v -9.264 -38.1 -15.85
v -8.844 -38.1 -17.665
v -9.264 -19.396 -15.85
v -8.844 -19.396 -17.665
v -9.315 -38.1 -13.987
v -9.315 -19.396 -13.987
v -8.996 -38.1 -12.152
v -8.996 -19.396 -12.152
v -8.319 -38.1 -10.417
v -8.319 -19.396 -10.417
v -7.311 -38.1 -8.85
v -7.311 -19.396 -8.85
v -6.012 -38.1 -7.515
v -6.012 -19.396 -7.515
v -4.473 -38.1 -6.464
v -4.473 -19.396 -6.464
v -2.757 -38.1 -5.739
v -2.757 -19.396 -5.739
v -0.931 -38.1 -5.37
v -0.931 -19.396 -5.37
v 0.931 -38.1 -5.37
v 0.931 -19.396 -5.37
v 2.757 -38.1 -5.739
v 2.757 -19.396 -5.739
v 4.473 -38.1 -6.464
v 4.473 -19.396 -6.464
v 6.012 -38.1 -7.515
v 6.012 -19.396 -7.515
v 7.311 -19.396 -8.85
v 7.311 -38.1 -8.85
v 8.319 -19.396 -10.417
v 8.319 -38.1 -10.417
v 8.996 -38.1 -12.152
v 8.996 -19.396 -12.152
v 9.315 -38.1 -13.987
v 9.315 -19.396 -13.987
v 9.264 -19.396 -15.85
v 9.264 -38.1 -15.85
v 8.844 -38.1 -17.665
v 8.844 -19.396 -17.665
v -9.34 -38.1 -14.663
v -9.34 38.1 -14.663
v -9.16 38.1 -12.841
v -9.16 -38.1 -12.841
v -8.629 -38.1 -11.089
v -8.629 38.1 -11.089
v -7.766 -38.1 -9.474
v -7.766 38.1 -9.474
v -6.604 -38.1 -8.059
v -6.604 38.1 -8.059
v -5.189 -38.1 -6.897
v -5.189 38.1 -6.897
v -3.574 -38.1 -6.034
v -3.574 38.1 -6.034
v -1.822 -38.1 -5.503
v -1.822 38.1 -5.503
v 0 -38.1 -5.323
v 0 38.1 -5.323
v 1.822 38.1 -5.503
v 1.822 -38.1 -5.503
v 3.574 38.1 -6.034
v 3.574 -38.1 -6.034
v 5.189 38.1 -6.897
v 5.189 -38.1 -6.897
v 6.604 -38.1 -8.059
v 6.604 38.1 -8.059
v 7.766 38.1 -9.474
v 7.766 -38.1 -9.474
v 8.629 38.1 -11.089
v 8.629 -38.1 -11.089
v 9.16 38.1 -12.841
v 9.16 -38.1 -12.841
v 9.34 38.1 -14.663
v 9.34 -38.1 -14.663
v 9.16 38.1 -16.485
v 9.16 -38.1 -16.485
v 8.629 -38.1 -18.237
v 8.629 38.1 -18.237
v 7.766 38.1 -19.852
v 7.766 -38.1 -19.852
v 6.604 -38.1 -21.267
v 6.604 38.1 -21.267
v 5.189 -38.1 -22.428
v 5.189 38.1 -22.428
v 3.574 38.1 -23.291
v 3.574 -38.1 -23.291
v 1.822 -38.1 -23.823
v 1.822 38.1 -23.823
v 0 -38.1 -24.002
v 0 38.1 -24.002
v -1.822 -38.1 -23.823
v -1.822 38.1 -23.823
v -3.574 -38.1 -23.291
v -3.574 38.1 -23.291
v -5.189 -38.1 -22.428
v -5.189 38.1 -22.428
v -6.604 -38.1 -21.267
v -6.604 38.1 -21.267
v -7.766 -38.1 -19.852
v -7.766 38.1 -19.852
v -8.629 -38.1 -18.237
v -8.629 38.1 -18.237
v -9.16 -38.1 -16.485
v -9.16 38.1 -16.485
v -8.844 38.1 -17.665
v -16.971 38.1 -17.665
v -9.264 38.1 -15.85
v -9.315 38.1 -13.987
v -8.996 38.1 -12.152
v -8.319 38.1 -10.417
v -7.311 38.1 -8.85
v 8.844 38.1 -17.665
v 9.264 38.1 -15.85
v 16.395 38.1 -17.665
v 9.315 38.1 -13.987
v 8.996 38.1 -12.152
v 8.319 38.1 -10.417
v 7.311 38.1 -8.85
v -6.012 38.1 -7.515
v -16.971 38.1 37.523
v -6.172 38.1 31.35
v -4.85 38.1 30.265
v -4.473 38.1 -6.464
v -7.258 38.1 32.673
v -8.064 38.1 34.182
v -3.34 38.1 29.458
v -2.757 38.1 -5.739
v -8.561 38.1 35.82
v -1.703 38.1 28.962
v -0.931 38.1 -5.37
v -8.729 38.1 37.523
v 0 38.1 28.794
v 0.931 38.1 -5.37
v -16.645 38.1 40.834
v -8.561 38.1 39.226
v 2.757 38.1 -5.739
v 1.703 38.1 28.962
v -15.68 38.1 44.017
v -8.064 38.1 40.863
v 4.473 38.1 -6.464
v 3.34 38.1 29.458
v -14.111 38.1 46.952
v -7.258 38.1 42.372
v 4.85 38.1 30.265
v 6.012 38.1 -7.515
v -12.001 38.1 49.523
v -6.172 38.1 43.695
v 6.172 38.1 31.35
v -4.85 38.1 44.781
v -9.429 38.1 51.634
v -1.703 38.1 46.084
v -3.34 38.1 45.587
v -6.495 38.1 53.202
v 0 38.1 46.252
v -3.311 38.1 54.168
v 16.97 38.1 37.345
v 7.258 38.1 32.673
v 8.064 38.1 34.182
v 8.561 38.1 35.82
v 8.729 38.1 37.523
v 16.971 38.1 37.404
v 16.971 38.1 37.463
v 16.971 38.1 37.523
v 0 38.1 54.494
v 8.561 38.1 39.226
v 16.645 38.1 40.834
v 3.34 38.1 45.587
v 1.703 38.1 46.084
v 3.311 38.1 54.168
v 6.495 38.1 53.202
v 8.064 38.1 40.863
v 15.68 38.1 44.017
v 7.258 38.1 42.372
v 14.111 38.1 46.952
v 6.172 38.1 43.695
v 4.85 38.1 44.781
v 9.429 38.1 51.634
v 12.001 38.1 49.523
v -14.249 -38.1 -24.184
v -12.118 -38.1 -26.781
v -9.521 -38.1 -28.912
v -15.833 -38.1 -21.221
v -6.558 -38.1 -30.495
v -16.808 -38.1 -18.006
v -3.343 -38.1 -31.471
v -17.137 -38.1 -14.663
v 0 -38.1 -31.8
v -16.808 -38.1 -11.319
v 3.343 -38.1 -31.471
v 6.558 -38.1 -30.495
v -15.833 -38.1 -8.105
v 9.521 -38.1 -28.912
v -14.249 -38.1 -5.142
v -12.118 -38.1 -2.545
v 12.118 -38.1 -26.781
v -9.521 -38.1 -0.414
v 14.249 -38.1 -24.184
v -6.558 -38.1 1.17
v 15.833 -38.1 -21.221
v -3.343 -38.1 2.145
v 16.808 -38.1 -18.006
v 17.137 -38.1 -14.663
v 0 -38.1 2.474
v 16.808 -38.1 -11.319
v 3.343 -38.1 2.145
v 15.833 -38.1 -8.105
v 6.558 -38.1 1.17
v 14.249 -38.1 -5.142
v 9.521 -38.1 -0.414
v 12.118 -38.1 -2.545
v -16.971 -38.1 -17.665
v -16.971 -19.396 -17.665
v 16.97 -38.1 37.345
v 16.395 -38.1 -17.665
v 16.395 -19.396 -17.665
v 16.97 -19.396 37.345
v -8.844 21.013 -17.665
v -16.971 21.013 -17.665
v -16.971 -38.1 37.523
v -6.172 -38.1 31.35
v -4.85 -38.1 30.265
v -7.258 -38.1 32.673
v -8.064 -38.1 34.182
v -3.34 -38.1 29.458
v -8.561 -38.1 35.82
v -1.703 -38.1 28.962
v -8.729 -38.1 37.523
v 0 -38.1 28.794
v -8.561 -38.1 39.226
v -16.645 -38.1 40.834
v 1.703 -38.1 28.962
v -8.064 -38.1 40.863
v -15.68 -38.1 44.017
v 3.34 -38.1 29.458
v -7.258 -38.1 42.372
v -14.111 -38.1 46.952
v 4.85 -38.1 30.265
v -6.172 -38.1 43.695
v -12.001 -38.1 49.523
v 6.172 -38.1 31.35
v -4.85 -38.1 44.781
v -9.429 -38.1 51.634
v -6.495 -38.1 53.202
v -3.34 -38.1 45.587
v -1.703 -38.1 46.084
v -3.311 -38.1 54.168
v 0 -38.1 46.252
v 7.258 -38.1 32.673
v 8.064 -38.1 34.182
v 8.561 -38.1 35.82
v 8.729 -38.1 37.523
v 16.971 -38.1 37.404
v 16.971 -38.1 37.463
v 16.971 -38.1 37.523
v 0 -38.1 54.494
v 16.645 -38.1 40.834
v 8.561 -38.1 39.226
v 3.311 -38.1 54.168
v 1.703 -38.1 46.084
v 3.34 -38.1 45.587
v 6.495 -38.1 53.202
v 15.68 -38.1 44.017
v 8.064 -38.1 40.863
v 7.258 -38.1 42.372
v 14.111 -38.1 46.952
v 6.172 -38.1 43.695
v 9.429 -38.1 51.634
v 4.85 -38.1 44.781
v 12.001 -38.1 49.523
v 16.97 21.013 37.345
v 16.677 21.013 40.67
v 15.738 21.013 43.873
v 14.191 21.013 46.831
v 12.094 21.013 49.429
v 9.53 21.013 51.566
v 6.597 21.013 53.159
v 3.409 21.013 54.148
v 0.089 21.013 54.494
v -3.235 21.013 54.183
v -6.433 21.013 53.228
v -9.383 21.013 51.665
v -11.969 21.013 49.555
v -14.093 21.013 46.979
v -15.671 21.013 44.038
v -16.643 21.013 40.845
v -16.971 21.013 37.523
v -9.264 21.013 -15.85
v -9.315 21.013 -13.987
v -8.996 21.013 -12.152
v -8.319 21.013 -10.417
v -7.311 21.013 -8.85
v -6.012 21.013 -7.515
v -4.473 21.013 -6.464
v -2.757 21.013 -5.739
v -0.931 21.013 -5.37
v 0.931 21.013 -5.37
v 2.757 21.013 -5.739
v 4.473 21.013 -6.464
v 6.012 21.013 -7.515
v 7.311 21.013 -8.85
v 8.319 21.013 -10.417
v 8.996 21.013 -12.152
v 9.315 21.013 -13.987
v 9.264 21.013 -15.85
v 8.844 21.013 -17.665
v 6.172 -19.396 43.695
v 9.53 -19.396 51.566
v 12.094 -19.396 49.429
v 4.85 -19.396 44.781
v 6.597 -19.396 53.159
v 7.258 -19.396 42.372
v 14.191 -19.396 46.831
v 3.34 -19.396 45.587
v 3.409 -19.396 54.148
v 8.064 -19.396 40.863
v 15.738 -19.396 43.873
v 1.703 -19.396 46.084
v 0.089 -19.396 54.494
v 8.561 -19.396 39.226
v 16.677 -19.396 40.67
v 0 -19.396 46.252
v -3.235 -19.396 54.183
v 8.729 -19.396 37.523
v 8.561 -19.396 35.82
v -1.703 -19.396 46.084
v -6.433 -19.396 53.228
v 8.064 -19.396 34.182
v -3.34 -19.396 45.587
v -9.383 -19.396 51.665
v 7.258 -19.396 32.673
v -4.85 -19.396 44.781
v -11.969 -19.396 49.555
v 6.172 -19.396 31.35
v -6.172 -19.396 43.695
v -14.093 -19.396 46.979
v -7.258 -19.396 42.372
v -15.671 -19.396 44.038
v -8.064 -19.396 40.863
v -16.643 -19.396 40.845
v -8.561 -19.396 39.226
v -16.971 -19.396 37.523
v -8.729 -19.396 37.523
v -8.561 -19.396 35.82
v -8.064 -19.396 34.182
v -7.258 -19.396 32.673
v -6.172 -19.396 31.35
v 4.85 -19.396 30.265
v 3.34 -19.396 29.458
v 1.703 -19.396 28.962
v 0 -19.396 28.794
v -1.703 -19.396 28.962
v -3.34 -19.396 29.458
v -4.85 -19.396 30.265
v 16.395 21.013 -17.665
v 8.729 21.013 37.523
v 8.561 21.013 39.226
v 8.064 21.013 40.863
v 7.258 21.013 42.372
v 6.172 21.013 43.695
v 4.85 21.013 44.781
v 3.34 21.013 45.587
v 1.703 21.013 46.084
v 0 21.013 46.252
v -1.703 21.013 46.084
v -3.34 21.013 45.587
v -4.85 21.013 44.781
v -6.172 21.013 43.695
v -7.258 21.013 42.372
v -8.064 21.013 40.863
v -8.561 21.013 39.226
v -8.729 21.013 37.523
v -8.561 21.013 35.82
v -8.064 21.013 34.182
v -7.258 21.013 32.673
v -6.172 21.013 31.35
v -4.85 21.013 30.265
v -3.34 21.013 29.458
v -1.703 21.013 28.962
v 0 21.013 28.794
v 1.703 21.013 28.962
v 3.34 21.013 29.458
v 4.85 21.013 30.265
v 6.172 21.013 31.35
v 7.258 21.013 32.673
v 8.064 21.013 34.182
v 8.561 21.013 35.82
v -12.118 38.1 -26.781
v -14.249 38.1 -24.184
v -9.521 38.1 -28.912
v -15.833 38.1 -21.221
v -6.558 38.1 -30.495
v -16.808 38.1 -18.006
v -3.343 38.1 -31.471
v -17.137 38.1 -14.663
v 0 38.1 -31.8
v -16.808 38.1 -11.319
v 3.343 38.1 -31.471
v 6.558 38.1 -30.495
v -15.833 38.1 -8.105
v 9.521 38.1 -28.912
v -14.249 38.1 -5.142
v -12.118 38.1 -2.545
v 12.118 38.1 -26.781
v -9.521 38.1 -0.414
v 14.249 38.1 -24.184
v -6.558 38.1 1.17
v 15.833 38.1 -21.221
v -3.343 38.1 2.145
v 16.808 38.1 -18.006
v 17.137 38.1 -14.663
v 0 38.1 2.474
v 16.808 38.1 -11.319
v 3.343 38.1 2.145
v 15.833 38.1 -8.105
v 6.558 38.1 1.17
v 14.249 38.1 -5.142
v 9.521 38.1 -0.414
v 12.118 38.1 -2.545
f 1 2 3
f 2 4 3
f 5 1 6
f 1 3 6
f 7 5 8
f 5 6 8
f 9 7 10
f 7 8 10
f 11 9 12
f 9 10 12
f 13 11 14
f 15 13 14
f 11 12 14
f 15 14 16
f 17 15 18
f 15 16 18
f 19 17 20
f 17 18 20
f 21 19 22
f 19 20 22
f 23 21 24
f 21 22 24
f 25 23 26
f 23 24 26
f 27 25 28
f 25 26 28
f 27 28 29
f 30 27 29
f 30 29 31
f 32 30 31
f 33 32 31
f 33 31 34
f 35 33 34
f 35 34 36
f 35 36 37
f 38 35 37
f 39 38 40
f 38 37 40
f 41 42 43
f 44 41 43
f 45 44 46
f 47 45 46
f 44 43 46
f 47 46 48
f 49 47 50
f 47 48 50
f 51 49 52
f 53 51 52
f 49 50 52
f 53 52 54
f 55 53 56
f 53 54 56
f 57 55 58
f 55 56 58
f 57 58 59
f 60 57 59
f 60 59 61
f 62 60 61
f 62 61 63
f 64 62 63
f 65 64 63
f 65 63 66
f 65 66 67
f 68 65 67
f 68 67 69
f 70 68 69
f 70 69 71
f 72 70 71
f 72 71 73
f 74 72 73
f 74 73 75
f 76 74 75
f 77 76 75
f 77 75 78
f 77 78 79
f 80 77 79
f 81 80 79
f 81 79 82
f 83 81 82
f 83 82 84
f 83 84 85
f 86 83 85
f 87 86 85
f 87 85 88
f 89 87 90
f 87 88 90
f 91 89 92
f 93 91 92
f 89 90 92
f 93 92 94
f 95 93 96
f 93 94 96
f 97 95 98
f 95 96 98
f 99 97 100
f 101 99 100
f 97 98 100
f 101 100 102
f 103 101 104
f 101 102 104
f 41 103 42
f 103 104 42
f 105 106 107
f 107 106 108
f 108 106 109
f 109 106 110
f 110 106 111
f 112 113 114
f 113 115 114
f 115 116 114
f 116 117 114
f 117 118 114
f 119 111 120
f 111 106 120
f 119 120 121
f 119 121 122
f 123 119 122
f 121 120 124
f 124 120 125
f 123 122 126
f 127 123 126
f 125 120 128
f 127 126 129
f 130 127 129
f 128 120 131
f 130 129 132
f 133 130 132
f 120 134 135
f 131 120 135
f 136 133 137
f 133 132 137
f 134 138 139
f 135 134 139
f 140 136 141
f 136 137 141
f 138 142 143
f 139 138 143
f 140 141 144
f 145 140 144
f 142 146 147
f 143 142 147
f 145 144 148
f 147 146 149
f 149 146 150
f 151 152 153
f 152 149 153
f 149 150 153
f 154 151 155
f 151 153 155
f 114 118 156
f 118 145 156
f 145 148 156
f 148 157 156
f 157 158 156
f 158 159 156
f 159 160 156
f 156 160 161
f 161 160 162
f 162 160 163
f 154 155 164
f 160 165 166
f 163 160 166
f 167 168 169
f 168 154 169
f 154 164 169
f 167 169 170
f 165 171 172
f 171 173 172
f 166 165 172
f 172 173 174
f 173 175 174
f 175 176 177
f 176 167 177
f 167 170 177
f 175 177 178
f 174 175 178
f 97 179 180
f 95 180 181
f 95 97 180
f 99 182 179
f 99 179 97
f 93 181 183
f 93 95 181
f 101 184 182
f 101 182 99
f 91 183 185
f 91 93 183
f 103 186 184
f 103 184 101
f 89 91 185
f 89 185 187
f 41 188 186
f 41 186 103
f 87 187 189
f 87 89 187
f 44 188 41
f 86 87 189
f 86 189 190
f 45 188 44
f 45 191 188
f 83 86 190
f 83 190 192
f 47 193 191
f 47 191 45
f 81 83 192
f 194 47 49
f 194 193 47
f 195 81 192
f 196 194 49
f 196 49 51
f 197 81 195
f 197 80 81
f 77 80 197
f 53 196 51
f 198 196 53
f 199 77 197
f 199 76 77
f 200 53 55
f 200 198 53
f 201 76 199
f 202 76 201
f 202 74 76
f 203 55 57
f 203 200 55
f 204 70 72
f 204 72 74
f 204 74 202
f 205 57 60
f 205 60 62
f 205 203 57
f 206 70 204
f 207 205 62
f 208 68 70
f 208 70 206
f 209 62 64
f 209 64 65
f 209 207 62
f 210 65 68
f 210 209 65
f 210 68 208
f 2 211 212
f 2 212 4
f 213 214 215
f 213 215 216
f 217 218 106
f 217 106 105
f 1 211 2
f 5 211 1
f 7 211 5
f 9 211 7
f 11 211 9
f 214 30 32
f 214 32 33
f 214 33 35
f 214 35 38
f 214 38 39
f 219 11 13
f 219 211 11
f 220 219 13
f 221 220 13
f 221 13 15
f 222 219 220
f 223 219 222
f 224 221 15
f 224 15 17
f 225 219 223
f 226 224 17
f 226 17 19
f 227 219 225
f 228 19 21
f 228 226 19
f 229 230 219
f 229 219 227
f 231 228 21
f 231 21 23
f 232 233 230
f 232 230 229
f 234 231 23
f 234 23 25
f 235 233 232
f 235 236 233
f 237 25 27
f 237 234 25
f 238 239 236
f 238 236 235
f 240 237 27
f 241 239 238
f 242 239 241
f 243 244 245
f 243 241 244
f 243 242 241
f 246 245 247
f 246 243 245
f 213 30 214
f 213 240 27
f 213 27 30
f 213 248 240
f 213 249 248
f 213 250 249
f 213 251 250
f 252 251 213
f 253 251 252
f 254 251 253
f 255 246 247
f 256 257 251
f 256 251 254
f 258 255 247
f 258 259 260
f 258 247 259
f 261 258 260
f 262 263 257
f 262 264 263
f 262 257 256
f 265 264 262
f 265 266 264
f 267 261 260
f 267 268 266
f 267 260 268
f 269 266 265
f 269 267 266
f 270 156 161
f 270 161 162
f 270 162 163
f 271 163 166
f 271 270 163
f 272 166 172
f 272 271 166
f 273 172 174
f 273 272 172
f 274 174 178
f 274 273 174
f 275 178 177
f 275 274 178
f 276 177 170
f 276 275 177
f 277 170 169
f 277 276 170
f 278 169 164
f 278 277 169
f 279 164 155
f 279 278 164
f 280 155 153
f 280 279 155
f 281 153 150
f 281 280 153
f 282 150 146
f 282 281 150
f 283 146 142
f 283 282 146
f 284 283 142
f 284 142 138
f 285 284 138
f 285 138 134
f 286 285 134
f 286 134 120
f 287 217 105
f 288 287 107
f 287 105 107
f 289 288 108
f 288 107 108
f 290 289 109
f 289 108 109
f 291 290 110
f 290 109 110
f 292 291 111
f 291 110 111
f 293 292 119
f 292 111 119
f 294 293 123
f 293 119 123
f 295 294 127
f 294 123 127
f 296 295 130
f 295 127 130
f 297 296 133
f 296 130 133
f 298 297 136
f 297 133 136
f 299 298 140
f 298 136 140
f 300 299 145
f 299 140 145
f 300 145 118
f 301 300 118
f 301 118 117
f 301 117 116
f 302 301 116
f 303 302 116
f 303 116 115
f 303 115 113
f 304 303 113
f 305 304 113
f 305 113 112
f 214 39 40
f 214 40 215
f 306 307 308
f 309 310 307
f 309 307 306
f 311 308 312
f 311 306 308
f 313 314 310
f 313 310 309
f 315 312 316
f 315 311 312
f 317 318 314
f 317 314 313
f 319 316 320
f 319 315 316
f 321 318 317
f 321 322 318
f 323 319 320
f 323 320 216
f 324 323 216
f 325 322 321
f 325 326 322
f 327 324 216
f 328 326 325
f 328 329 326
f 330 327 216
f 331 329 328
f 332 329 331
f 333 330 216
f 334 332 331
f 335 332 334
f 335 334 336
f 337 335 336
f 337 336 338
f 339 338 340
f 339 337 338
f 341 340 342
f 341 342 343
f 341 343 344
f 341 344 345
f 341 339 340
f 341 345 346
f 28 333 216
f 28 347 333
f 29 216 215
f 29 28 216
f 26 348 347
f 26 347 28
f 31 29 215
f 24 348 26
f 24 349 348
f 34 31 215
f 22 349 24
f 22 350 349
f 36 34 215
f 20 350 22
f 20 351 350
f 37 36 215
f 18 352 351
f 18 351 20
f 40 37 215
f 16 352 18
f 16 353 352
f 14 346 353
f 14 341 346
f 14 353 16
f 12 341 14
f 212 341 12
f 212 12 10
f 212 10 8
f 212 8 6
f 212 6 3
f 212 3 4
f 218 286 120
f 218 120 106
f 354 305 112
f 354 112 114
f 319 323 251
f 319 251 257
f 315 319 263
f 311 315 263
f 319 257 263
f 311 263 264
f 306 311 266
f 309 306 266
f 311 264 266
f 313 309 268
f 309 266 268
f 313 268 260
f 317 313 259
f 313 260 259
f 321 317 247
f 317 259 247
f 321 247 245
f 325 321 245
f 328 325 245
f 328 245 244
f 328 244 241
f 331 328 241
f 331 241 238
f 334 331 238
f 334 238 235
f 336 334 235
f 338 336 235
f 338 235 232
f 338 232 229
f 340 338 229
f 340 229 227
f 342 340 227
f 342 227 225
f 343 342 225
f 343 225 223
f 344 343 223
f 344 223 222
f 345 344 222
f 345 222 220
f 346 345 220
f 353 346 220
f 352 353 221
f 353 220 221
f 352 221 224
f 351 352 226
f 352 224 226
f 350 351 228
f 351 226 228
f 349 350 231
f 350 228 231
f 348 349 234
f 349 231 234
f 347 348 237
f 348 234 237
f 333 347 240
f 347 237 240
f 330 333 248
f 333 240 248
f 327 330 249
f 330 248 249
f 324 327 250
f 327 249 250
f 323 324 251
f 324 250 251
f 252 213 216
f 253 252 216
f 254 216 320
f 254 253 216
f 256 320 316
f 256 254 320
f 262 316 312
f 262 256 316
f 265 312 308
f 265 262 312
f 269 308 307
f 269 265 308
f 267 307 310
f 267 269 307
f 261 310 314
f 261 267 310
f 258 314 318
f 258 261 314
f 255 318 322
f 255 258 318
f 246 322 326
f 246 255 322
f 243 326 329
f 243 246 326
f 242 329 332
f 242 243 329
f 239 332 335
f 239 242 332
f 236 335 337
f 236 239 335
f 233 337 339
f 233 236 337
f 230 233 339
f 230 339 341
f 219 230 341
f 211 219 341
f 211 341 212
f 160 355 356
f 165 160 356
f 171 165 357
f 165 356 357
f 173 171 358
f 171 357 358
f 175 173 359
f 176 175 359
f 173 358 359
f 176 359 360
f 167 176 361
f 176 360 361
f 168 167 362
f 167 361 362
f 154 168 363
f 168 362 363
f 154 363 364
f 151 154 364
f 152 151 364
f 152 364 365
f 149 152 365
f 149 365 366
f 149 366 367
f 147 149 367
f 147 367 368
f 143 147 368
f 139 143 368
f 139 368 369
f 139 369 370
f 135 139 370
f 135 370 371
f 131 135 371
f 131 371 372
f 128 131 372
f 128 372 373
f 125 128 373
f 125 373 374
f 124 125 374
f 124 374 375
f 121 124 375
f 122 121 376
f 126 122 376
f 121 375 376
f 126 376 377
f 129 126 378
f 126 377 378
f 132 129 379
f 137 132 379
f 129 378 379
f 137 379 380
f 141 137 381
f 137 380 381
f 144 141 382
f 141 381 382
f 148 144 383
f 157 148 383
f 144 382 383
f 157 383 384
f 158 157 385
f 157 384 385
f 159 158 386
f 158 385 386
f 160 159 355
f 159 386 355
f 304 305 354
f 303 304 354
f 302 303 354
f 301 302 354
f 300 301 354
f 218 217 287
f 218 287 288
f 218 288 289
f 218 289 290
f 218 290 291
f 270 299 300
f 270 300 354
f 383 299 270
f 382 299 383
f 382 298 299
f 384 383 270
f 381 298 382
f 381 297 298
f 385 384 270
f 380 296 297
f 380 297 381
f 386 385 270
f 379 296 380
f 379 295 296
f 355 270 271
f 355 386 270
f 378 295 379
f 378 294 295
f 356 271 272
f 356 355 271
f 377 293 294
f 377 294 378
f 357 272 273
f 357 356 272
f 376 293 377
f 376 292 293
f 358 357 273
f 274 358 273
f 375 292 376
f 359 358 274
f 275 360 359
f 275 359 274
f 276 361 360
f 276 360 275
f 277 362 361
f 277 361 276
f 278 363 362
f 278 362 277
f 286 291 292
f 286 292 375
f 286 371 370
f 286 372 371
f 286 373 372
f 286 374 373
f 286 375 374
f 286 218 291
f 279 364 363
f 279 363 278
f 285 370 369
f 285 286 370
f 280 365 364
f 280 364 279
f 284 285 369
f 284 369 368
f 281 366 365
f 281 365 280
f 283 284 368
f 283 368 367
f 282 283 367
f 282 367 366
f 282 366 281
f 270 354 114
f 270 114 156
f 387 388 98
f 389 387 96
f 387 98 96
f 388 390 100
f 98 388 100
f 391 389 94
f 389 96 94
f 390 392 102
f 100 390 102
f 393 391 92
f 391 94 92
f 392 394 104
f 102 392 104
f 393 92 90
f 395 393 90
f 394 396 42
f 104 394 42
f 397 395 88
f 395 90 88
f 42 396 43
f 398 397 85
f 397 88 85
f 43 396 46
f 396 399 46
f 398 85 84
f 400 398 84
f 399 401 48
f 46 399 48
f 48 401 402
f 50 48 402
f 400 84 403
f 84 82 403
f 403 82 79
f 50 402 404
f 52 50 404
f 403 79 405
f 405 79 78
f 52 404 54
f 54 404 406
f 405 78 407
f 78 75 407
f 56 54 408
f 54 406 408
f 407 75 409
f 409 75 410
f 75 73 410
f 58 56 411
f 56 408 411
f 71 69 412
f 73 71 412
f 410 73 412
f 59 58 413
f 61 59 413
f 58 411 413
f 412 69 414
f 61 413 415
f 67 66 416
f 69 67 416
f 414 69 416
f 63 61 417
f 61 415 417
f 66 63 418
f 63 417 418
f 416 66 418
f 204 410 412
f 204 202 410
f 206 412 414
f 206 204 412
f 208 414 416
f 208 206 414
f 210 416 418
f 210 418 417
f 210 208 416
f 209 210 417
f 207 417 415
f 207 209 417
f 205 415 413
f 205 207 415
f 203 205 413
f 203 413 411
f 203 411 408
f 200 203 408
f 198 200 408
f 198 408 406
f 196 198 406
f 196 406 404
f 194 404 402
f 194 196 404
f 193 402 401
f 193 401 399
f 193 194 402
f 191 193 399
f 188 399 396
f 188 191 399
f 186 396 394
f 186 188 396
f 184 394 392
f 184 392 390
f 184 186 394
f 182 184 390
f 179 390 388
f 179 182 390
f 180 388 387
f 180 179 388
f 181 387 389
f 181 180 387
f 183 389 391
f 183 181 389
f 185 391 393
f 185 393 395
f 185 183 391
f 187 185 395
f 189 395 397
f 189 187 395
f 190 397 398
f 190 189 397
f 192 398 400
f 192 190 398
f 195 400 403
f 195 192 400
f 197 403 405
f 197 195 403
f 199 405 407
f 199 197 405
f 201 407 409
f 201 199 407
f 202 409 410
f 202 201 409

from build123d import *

# Parameters (mm, degrees)
F1_DEPTH      = 38.1
F1_DEPTH_BACK = 38.1
F3_DEPTH      = 16.9724266167
F3_DEPTH_BACK = 16.9724266167
F4_R          = 17.1371283182
F5_DEPTH      = 38.1
F5_DEPTH_BACK = 38.1
F6_R          = 9.3396405189
F7_DEPTH      = 76.201
F8_R          = 8.7289393375
F9_DEPTH      = 76.201


with BuildPart() as f1:
    # F0 (on Front) → F1 (new body, two sides)
    with BuildSketch(Plane.XZ) as f1_sk:
        with BuildLine():
            ThreePointArc((16.9704964699, 37.3450435441), (16.9711940784, 37.4338834352), (16.9714266167, 37.5227257609))
            ThreePointArc((16.9714266167, 37.5227257609), (0, 54.4941523776), (-16.9714266167, 37.5227257609))
            ThreePointArc((-16.9714266167, 37.5227257609), (-0.0888423257, 20.5515316826), (16.9704964699, 37.3450435441))
        make_face()
        with BuildLine():
            ThreePointArc((16.9704964699, 37.3450435441), (-0.0888423257, 20.5515316826), (-16.9714266167, 37.5227257609))
            Line((-16.9714266167, 37.5227257609), (-16.9714266167, -17.664546147))
            Line((-16.9714266167, -17.664546147), (16.3945443928, -17.664546147))
            Line((16.3945443928, -17.664546147), (16.9704964699, 37.3450435441))
        make_face()
    extrude(amount=F1_DEPTH)
    extrude(f1_sk.sketch, amount=-F1_DEPTH_BACK)

    # F2 (on Right) → F3 (cut, two sides)
    with BuildSketch(Plane.YZ) as f3_sk:
        Polygon((21.0127271712, 62.691822648), (-19.3963646889, 59.690002352), (-19.3963646889, -24.5918184519), (21.0127271712, -24.5918184519), align=None)
    extrude(amount=F3_DEPTH, mode=Mode.SUBTRACT)
    extrude(f3_sk.sketch, amount=-F3_DEPTH_BACK, mode=Mode.SUBTRACT)


with BuildPart() as f5:
    # F4 (on Front) → F5 (new body, two sides)
    with BuildSketch(Plane.XZ) as f5_sk:
        with Locations((0, -14.6627277136)):
            Circle(F4_R)
    extrude(amount=F5_DEPTH)
    extrude(f5_sk.sketch, amount=-F5_DEPTH_BACK)


with BuildPart() as f7_tool:
    # F6 (on face) → F7 (new body, through all)
    with BuildSketch(Plane(origin=(0, 38.1, 0), x_dir=(-1, 0, 0), z_dir=(0, 1, 0))):
        with Locations((0, -14.6627277136)):
            Circle(F6_R)
    extrude(amount=-F7_DEPTH)


with BuildPart() as f1_1:
    add(f1.part)

    # F7: cut by f7_tool
    add(f7_tool.part, mode=Mode.SUBTRACT)

    # F8 (on face) → F9 (cut, through all)
    with BuildSketch(Plane.XZ.offset(38.1)):
        with Locations((0, 37.5227257609)):
            Circle(F8_R)
    extrude(amount=-F9_DEPTH, mode=Mode.SUBTRACT)


with BuildPart() as f5_1:
    add(f5.part)

    # F7: cut by f7_tool
    add(f7_tool.part, mode=Mode.SUBTRACT)


solid = Compound([f1_1.part, f5_1.part])
